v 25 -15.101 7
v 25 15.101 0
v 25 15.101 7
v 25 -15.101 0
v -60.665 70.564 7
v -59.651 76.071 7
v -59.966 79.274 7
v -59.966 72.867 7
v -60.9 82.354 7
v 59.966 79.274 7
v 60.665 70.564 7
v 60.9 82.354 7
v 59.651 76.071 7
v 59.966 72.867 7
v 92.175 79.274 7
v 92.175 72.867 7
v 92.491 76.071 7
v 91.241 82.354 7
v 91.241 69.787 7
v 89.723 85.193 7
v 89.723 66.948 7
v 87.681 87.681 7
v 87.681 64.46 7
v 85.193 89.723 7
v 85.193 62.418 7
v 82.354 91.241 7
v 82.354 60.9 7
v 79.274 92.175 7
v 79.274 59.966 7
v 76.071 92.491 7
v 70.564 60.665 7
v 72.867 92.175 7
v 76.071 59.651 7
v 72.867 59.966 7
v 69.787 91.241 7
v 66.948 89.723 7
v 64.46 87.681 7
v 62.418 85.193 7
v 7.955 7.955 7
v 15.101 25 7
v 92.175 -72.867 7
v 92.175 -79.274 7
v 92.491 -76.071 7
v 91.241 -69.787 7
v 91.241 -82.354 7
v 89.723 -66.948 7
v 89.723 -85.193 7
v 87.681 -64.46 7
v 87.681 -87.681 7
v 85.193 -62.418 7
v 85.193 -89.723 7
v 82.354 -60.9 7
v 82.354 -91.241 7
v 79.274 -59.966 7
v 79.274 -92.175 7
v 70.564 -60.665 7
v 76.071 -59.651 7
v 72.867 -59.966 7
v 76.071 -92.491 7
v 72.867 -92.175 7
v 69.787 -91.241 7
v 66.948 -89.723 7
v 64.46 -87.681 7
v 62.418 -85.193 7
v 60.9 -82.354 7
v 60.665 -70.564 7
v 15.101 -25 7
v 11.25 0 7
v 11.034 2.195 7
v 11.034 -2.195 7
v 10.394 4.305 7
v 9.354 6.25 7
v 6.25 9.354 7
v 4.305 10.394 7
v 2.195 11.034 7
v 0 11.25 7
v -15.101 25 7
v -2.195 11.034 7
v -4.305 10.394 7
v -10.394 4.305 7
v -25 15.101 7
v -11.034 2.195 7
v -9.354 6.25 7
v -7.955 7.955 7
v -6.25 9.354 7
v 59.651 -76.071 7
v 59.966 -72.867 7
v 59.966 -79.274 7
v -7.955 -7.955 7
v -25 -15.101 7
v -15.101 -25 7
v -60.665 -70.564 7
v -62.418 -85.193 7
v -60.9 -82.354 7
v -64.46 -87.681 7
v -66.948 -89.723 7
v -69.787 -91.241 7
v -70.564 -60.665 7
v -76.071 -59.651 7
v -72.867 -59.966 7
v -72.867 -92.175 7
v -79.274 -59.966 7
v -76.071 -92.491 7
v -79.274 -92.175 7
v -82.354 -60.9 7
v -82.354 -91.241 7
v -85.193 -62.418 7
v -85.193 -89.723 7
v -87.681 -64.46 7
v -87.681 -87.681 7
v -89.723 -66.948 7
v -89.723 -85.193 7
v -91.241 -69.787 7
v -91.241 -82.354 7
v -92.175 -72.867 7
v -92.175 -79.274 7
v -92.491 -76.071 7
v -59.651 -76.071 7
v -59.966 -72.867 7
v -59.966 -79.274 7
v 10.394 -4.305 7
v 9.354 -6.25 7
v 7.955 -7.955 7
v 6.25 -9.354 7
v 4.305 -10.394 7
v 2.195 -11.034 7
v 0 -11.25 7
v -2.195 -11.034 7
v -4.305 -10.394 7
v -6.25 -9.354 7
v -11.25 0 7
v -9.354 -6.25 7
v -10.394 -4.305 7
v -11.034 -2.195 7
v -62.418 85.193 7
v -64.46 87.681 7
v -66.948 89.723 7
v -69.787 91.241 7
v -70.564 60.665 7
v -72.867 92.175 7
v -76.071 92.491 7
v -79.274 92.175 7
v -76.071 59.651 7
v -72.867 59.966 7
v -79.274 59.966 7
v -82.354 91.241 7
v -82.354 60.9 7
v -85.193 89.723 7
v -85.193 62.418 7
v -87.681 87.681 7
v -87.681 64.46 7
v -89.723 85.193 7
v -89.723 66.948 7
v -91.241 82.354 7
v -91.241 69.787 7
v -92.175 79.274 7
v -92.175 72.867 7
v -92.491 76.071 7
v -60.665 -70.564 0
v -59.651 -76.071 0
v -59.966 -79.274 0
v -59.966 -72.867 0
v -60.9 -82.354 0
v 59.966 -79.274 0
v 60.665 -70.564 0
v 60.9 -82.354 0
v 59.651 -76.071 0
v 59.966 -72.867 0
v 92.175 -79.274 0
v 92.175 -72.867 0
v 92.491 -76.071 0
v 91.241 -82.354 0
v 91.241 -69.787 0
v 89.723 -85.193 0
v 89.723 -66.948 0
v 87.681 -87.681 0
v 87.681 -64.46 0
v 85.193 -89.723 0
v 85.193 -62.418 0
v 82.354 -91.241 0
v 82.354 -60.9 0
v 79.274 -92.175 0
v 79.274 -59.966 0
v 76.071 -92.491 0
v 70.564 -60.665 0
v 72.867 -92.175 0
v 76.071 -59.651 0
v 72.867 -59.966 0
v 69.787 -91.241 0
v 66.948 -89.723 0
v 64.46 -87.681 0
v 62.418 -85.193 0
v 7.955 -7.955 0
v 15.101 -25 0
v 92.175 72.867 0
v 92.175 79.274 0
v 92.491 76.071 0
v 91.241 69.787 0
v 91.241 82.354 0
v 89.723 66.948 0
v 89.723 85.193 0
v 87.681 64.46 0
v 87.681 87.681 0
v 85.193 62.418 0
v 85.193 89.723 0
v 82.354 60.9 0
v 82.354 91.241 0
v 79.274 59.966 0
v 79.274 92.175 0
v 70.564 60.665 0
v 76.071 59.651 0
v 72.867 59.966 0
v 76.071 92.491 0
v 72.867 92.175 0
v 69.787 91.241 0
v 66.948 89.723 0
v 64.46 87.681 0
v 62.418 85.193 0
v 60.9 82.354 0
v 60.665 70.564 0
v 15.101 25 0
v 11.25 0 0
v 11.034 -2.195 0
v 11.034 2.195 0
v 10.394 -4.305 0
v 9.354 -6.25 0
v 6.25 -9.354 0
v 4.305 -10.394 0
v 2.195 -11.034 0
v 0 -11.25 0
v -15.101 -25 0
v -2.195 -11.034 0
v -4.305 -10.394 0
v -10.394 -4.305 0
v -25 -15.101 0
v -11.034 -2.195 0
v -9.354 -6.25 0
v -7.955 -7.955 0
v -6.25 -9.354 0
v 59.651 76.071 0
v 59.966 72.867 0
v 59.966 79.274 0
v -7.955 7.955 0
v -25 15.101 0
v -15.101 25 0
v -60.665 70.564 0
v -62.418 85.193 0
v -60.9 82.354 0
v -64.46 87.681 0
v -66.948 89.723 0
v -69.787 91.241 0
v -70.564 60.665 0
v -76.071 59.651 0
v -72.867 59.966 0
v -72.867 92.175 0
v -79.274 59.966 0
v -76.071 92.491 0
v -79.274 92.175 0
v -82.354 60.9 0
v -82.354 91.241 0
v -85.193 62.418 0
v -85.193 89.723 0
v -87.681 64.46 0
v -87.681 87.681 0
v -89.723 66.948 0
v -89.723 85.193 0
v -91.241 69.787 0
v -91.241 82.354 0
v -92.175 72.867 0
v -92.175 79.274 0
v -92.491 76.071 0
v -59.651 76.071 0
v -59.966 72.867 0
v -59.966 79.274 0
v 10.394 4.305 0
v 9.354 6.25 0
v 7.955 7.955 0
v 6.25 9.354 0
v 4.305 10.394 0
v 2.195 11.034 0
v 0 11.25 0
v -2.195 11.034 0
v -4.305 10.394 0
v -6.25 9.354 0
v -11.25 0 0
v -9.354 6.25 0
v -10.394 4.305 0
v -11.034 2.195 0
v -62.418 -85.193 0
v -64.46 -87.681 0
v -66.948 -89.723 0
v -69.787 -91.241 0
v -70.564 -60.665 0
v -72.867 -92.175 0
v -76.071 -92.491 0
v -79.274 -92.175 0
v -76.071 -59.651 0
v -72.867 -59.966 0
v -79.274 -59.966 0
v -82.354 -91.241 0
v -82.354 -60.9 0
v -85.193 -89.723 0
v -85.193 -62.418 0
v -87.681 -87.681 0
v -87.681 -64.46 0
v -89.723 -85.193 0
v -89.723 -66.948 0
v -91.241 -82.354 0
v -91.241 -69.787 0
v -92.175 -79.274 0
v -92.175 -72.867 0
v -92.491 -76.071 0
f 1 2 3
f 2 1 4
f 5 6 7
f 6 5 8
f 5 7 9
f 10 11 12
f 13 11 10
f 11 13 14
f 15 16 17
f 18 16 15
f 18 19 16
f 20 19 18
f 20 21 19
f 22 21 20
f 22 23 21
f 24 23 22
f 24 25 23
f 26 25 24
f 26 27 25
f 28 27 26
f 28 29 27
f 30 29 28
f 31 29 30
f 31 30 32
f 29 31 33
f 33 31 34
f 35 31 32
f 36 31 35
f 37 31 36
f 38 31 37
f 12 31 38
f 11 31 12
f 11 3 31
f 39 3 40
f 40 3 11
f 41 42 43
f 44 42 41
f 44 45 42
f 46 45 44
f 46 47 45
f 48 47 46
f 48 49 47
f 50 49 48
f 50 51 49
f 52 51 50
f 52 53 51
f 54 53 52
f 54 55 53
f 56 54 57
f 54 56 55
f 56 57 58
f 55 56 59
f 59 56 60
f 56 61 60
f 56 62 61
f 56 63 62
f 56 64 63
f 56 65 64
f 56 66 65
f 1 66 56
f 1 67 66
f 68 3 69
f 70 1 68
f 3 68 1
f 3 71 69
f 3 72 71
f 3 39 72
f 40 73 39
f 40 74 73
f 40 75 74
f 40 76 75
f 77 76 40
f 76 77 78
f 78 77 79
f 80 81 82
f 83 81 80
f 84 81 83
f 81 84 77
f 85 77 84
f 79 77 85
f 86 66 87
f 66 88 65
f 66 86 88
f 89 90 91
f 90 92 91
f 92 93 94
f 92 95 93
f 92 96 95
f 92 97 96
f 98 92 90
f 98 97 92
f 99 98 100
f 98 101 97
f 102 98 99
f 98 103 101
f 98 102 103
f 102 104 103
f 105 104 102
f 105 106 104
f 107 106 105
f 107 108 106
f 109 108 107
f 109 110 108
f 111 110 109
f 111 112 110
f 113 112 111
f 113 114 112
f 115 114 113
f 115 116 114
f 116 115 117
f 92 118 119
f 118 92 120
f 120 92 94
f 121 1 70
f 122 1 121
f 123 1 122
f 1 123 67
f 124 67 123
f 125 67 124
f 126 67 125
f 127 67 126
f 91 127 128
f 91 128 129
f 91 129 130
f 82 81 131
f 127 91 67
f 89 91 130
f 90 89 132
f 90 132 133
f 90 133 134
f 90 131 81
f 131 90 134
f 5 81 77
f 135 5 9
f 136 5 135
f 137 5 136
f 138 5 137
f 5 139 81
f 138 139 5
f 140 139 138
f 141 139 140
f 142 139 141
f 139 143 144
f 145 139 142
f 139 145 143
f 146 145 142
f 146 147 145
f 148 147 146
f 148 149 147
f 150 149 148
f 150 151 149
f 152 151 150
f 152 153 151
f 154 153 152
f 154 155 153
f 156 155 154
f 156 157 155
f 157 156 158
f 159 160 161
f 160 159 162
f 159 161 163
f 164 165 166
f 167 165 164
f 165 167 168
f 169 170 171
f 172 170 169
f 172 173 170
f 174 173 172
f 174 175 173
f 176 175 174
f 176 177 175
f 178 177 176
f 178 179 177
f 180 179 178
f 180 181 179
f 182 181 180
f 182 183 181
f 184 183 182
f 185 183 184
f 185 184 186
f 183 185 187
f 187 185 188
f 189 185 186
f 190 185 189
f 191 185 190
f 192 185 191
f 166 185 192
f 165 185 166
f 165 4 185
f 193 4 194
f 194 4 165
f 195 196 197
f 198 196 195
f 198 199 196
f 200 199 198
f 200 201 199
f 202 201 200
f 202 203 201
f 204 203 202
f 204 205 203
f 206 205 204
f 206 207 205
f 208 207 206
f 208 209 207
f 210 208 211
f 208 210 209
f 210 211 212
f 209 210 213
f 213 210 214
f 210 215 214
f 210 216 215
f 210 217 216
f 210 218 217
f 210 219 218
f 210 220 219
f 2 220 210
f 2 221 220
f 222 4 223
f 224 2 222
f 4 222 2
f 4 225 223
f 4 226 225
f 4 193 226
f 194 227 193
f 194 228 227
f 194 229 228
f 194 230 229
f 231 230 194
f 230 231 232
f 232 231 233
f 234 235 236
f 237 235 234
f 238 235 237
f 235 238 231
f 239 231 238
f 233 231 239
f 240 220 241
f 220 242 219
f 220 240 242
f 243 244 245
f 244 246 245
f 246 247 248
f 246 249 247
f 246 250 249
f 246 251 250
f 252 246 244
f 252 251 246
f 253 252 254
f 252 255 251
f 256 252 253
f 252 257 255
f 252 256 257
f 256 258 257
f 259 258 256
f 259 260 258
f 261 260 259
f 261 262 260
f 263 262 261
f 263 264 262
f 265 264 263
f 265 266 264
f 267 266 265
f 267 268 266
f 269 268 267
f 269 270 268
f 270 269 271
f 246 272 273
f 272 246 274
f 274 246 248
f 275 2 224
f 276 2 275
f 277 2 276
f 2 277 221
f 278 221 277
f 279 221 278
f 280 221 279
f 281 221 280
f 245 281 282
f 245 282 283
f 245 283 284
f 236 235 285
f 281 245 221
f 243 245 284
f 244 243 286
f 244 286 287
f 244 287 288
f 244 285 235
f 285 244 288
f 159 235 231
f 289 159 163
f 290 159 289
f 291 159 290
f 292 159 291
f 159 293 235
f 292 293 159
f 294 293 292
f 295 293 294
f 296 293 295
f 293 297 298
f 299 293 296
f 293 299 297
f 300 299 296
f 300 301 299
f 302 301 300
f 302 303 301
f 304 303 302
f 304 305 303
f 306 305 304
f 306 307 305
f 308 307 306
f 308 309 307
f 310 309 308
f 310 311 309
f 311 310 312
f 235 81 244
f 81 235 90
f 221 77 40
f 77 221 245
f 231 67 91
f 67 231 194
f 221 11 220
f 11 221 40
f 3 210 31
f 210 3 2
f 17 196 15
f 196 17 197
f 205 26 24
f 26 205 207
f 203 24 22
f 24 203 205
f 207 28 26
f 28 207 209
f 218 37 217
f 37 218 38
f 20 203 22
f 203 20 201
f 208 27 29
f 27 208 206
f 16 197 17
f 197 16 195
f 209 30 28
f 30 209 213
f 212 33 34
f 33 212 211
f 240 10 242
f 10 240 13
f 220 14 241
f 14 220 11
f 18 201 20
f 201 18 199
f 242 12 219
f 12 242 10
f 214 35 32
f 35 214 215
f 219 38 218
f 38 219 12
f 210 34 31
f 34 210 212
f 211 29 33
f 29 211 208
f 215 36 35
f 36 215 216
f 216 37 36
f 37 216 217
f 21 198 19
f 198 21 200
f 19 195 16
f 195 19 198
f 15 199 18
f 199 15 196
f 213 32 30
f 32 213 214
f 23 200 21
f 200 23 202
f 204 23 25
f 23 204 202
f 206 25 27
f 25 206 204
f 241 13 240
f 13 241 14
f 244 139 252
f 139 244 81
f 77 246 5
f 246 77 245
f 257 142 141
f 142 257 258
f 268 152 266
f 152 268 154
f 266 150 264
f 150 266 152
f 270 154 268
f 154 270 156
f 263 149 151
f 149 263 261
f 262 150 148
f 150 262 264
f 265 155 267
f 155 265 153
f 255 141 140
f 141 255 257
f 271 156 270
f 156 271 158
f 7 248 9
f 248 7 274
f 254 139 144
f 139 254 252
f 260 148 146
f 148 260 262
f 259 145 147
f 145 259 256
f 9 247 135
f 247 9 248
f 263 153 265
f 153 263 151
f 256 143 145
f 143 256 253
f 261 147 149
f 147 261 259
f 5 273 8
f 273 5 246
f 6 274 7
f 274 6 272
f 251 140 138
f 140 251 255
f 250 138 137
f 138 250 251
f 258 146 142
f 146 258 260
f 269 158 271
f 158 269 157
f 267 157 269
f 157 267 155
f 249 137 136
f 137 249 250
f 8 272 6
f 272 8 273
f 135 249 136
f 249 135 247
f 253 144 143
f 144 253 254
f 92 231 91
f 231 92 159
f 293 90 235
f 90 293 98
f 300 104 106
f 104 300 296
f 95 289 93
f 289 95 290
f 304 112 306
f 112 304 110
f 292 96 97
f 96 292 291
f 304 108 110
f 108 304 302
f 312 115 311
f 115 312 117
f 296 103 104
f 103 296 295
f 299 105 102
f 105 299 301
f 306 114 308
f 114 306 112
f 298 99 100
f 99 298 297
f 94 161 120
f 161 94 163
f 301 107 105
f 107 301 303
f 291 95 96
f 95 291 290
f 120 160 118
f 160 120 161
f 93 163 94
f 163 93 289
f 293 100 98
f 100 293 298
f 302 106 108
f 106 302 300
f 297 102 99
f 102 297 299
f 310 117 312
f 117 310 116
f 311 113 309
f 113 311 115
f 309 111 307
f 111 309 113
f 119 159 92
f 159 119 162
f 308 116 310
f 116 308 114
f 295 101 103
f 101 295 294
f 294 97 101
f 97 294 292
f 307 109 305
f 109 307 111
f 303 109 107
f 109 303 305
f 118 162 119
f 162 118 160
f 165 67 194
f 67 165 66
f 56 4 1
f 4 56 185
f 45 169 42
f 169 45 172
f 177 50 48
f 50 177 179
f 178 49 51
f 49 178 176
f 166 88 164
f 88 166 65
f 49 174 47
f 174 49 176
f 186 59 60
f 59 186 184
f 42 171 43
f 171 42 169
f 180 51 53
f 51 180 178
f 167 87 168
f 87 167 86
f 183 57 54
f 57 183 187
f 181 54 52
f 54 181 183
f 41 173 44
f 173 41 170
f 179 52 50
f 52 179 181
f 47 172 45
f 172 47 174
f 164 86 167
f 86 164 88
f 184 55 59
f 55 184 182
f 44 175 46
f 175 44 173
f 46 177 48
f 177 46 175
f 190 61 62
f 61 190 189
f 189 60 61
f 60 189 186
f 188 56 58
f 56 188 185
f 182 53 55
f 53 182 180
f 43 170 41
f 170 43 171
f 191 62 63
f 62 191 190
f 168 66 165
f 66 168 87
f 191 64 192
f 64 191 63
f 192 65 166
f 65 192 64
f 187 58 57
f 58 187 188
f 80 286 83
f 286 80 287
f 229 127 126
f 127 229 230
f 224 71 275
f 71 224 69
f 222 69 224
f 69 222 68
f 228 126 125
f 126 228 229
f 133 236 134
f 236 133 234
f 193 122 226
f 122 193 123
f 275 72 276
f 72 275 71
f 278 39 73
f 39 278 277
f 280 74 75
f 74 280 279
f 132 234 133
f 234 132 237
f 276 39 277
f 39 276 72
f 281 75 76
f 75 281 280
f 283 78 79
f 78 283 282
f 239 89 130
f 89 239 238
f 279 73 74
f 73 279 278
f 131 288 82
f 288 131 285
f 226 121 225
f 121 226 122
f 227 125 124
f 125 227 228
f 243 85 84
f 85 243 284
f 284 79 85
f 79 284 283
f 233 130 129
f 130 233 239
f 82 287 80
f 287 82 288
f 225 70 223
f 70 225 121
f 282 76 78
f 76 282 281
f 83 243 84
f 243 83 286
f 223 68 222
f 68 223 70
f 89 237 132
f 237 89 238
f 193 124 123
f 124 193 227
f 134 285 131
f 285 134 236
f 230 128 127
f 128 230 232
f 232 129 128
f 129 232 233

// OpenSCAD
$fn = 32;

// ----------------------------------------------------------------------
// Quadcopter frame: 248 mm across the motor pads, arms 107.58 mm
// ----------------------------------------------------------------------

// --- parameters (mm) ---
hub = 50;                 // central plate size
plate_t = 7;              // plate thickness
arm_len = 107.58;         // hub centre to motor pad centre
bar_w = 14;               // arm width
pad_d = 32.84;            // motor pad diameter
centre_d = 22.5;          // central cut-out for the stack

module arm_bar() {
  /* flat bar: hull of a stub inside the hub and a box at the pad */
  hull() {
    translate([hub / 4, 0, plate_t / 2]) cube([bar_w, bar_w, plate_t], center = true);
    translate([arm_len, 0, plate_t / 2]) cube([bar_w, bar_w, plate_t], center = true);
  }
}

module pad() {
  translate([arm_len, 0, 0]) cylinder(h = plate_t, d = pad_d);
}

module frame() {
  translate([-hub / 2, -hub / 2, 0]) cube([hub, hub, plate_t]);
  rotate([0, 0, 45]) arm_bar();
  rotate([0, 0, 45]) pad();
  rotate([0, 0, 135]) arm_bar();
  rotate([0, 0, 135]) pad();
  rotate([0, 0, 225]) arm_bar();
  rotate([0, 0, 225]) pad();
  rotate([0, 0, 315]) arm_bar();
  rotate([0, 0, 315]) pad();
}

difference() {
  frame();
  translate([0, 0, -1]) cylinder(h = plate_t + 2, d = centre_d);
}
